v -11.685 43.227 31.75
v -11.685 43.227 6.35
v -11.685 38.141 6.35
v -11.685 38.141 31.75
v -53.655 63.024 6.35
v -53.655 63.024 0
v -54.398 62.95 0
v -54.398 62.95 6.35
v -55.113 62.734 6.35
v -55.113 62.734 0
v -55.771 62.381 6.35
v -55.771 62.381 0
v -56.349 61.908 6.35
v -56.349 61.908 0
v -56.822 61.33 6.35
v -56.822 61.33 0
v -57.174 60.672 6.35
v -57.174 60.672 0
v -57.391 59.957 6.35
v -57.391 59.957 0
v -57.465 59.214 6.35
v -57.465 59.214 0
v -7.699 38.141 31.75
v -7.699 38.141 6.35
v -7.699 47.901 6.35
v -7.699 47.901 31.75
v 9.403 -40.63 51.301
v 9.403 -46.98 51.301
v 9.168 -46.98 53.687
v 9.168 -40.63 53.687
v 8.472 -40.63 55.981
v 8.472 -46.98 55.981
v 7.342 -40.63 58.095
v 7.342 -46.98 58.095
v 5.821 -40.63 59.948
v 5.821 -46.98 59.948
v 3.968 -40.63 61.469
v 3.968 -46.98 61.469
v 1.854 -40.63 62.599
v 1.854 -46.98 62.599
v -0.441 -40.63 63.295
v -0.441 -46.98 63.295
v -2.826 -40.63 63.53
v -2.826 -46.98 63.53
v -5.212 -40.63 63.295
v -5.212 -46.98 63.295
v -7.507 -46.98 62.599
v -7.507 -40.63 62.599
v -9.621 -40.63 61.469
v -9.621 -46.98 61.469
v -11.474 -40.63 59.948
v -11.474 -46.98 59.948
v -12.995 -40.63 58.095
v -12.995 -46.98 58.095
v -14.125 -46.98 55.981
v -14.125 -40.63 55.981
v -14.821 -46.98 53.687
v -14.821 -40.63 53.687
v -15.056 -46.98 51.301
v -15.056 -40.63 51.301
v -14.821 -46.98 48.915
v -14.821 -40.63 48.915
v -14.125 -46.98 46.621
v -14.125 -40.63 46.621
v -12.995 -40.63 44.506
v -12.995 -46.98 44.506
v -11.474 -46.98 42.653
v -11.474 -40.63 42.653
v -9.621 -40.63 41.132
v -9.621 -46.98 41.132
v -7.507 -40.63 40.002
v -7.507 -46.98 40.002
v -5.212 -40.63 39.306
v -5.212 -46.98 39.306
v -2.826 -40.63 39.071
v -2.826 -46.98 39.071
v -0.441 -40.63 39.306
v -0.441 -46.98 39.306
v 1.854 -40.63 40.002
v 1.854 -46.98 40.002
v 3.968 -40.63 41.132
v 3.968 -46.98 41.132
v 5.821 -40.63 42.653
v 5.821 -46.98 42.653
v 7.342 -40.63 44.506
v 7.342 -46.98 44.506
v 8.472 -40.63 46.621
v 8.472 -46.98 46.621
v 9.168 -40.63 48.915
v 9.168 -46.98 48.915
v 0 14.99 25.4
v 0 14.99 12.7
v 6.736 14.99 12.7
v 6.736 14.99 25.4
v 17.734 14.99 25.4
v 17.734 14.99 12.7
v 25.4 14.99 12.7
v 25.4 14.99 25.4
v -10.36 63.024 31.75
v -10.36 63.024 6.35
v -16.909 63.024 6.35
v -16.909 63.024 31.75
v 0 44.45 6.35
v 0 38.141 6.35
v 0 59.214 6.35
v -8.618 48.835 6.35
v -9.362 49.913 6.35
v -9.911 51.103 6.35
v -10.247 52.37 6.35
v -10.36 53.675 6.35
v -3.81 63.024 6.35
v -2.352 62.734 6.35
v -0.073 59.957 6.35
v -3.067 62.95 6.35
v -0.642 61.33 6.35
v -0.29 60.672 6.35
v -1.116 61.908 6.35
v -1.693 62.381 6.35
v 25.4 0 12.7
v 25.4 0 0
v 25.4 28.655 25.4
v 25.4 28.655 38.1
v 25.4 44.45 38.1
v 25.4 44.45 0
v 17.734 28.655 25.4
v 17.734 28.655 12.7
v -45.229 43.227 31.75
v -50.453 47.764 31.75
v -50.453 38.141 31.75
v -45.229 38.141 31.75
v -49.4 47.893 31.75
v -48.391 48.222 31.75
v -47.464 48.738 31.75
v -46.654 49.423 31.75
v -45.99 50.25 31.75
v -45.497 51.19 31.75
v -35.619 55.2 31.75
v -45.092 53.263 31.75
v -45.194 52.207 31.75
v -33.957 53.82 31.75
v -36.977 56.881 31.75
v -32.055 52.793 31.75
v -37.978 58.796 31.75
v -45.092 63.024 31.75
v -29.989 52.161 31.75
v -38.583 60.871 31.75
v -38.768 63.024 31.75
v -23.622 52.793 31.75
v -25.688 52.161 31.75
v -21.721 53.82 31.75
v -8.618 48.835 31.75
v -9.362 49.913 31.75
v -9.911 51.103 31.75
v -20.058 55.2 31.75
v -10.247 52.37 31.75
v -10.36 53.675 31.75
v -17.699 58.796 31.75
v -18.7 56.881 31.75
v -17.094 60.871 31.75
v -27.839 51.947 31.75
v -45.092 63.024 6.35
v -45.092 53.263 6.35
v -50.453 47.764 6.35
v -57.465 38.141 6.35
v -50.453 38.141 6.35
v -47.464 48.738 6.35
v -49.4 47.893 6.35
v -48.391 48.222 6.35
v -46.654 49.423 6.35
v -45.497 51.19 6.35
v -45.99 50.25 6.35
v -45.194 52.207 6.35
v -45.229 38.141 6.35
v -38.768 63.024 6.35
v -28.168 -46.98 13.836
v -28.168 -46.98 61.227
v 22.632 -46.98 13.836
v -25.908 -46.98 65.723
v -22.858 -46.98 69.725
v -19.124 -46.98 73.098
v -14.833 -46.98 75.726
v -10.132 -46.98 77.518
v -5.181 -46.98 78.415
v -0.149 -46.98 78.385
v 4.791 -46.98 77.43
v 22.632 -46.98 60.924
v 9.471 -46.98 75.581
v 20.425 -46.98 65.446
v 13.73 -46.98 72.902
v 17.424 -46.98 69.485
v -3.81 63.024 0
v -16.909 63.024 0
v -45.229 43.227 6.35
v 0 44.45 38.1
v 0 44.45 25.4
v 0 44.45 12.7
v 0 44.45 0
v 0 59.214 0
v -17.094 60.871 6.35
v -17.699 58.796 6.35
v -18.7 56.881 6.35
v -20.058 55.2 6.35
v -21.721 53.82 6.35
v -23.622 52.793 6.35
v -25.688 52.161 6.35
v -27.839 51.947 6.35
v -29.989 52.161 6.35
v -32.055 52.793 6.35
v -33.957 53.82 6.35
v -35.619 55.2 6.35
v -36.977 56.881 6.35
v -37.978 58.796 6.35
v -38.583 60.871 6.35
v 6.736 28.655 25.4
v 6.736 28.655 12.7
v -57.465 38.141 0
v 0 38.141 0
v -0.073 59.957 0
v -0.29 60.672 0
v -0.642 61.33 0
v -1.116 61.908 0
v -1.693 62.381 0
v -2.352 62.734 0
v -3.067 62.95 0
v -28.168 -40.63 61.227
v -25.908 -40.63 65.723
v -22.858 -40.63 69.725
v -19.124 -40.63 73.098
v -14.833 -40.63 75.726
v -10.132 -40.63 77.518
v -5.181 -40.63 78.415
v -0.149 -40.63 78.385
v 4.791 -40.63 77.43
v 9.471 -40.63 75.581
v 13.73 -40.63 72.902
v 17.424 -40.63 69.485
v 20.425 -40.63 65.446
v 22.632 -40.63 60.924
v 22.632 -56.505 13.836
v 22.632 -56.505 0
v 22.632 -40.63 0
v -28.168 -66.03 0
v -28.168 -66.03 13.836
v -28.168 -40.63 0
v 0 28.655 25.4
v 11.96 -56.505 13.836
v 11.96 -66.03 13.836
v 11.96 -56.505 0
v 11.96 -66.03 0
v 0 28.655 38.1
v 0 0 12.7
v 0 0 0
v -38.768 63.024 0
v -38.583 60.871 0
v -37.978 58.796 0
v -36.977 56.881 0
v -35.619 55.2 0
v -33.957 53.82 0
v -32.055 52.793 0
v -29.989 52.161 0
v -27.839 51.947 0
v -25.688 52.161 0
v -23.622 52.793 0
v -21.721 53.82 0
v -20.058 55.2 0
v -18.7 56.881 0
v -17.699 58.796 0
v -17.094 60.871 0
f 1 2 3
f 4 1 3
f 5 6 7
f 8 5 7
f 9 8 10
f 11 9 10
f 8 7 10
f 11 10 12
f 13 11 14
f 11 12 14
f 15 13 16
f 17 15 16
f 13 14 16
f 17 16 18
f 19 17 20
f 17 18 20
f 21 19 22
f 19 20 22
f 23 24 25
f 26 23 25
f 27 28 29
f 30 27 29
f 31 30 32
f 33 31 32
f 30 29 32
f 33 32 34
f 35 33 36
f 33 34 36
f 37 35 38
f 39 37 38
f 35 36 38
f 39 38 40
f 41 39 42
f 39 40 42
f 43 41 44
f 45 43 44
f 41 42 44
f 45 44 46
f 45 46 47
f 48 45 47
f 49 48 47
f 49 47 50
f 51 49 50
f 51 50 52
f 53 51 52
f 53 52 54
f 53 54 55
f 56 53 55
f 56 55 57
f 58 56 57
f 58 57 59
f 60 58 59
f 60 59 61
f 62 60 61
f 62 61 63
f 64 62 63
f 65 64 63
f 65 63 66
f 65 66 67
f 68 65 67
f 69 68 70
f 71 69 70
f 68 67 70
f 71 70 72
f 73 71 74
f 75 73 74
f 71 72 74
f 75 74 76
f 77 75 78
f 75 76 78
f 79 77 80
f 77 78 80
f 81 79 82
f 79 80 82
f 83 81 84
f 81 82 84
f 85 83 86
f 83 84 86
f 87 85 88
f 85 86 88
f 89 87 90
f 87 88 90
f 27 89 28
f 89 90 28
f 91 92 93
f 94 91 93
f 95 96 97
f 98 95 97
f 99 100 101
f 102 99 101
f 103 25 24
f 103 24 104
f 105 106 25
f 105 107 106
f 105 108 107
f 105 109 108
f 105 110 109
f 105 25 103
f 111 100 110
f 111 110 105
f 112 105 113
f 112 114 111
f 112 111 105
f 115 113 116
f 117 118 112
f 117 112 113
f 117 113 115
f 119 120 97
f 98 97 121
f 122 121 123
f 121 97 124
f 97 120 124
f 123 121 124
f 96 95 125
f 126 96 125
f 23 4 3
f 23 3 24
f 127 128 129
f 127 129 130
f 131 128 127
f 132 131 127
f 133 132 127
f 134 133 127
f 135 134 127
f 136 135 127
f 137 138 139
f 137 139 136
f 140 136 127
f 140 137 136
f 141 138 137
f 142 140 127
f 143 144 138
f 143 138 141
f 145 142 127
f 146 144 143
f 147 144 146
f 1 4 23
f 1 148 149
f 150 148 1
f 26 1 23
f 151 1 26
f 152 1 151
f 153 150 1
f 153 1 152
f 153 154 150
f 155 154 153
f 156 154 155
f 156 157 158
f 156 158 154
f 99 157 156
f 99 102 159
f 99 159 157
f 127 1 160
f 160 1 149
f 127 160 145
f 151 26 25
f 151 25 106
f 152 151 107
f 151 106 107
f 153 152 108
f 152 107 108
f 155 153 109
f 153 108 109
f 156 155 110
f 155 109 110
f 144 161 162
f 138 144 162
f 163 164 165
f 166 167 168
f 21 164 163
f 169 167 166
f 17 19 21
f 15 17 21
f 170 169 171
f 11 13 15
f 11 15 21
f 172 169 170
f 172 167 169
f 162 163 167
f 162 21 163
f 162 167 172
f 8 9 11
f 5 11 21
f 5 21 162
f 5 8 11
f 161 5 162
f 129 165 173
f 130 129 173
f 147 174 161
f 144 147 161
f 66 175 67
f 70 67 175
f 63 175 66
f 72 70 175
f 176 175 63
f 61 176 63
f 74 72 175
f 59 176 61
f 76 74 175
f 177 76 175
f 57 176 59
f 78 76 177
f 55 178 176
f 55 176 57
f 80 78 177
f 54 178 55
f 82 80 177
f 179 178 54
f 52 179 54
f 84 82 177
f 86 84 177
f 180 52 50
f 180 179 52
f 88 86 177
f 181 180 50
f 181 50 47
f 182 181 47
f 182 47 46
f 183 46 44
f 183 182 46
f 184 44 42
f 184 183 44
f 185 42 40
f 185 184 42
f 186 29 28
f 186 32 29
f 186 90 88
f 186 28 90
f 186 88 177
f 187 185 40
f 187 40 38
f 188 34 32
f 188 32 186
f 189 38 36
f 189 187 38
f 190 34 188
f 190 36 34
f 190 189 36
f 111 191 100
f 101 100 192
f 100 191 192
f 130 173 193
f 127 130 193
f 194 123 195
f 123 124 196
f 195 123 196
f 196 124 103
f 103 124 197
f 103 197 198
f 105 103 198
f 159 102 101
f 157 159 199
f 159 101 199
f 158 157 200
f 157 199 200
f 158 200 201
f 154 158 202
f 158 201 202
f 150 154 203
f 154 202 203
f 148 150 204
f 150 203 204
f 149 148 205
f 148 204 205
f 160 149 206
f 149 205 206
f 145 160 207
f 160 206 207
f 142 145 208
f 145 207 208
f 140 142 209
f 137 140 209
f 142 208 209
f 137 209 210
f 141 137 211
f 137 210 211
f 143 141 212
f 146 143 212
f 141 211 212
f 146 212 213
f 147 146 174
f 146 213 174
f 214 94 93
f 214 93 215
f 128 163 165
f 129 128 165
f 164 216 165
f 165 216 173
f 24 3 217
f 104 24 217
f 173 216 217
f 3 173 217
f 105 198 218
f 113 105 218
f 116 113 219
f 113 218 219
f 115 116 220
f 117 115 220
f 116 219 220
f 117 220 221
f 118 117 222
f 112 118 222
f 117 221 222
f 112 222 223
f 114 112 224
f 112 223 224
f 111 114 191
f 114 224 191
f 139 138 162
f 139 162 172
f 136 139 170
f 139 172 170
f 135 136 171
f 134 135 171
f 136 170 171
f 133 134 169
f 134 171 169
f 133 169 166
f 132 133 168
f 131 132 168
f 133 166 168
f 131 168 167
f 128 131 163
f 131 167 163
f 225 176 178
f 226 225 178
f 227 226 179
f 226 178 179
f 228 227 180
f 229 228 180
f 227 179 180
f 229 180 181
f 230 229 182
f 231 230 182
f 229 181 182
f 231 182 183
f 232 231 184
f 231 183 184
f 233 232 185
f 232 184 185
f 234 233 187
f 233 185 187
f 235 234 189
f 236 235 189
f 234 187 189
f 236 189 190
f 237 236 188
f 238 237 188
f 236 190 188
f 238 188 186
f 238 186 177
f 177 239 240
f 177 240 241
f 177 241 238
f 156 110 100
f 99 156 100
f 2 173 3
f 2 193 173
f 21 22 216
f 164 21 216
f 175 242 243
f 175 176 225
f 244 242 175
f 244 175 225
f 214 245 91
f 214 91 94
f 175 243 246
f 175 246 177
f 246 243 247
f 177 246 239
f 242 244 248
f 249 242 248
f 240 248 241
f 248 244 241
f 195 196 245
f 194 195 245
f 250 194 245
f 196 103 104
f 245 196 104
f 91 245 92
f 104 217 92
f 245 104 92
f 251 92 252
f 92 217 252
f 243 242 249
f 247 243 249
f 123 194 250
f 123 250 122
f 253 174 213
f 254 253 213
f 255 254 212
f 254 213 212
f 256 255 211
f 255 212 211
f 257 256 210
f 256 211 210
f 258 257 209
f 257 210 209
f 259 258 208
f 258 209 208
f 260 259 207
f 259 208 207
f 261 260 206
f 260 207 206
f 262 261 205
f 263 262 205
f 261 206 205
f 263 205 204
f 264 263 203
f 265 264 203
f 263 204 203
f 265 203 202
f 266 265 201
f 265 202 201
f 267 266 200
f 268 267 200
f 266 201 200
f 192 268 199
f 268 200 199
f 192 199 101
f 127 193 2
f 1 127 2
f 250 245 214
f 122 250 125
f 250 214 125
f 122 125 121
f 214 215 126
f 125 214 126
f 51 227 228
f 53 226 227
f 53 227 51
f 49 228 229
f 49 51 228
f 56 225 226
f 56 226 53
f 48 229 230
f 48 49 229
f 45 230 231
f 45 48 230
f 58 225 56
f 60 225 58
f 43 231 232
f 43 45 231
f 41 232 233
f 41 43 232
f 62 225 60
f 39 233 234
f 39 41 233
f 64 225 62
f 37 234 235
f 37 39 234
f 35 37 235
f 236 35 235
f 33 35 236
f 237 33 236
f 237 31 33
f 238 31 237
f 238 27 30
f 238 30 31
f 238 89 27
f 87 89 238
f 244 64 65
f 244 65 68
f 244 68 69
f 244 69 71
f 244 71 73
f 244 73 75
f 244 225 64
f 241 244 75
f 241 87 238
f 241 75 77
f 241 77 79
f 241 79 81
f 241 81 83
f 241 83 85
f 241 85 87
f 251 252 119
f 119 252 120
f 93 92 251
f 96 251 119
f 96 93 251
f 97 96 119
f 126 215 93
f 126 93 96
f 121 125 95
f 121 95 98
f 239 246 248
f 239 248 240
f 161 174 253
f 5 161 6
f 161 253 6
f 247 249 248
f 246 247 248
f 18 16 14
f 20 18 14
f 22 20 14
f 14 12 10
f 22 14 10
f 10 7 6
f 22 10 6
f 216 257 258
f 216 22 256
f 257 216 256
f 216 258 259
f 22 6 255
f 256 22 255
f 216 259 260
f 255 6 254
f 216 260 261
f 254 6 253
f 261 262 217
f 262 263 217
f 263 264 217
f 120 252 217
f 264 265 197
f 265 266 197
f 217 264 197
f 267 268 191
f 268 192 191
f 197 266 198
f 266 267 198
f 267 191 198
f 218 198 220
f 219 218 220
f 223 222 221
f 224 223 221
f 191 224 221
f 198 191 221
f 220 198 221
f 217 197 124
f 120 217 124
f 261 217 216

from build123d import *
from build123d import SkipClean  # not in build123d's __all__

# Parameters (mm, degrees)
F0_W      = 25.4
F0_H      = 44.45
F1_DEPTH  = 12.7
F2_W      = 25.4
F2_H      = 29.4602914497
F3_DEPTH  = 12.7
F4_W      = 10.9979929402
F4_H      = 13.6651070789
F5_DEPTH  = 12.7
F7_DEPTH  = 12.7
F8_W      = 50.8
F8_H      = 25.4
F9_DEPTH  = 101.6
F11_DEPTH = 25.4
F12_R     = 12.2295787835
F13_DEPTH = 25.4
F14_R     = 12.2295787835
F15_DEPTH = 19.05
F16_W     = 10.6714690655
F16_H     = 9.525
F17_DEPTH = 25.4
F19_DEPTH = 6.35
F21_DEPTH = 25.4
F23_DEPTH = 25.4


with BuildPart() as f1:
    # F0 (on Top) → F1 (new body)
    with BuildSketch(Plane.XY):
        with Locations((12.7, 22.225)):
            Rectangle(F0_W, F0_H)
    extrude(amount=F1_DEPTH)

    # F2 (on face) → F3 (join)
    with BuildSketch(Plane.XY.offset(12.7)):
        with Locations((12.7, 29.7198542751)):
            Rectangle(F2_W, F2_H)
    extrude(amount=F3_DEPTH)

    # F4 (on face) → F5 (cut)
    with BuildSketch(Plane.XY.offset(25.4)):
        with Locations((12.2352666222, 21.8222620897)):
            Rectangle(F4_W, F4_H)
    extrude(amount=-F5_DEPTH, mode=Mode.SUBTRACT)

    # F6 (on face) → F7 (join)
    with BuildSketch(Plane.XY.offset(25.4)):
        Polygon((25.4, 44.45), (0, 44.45), (0, 28.6548156291), (6.736270152, 28.6548156291), (17.7342630923, 28.6548156291), (25.4, 28.6548156291), align=None)
    extrude(amount=F7_DEPTH)

    # F18 (on Top) → F19 (join)
    with BuildSketch(Plane.XY):
        with BuildLine():
            Line((-3.81, 63.023544848), (-53.6545139277, 63.023544848))
            ThreePointArc((-53.6545139277, 63.023544848), (-56.348590764, 61.9076216843), (-57.4645139277, 59.213544848))
            Line((-57.4645139277, 59.213544848), (-57.4645139277, 38.1405837834))
            Line((-57.4645139277, 38.1405837834), (0, 38.1405837834))
            Line((0, 38.1405837834), (0, 59.213544848))
            ThreePointArc((0, 59.213544848), (-1.1159231637, 61.9076216843), (-3.81, 63.023544848))
        make_face()
    extrude(amount=F19_DEPTH)

    # F20 (on face) → F21 (cut)
    with BuildSketch(Plane.XY.offset(6.35)):
        with BuildLine():
            Line((-16.9094149023, 63.023544848), (-38.7679263949, 63.023544848))
            ThreePointArc((-38.7679263949, 63.023544848), (-27.8386706486, 51.9472434828), (-16.9094149023, 63.023544848))
        make_face()
    extrude(amount=-F21_DEPTH, mode=Mode.SUBTRACT)

    # F22 (on face) → F23 (join)
    with BuildSketch(Plane.XY.offset(6.35)):
        with BuildLine():
            Line((-45.2292449772, 38.1405837834), (-45.2292449772, 43.2271584868))
            Line((-45.2292449772, 43.2271584868), (-11.6853676736, 43.2271584868))
            Line((-11.6853676736, 43.2271584868), (-11.6853676736, 38.1405837834))
            Line((-11.6853676736, 38.1405837834), (-7.6985950582, 38.1405837834))
            Line((-7.6985950582, 38.1405837834), (-7.6985950582, 47.9013063014))
            ThreePointArc((-7.6985950582, 47.9013063014), (-9.6624188313, 50.4964154712), (-10.3597074512, 53.6752492189))
            Line((-10.3597074512, 53.6752492189), (-10.3597074512, 63.023544848))
            Line((-10.3597074512, 63.023544848), (-16.9094149023, 63.023544848))
            ThreePointArc((-16.9094149023, 63.023544848), (-27.8386706486, 51.9472434828), (-38.7679263949, 63.023544848))
            Line((-38.7679263949, 63.023544848), (-45.0917705894, 63.023544848))
            Line((-45.0917705894, 63.023544848), (-45.0917705894, 53.2628260553))
            ThreePointArc((-45.0917705894, 53.2628260553), (-46.6539859613, 49.4227442996), (-50.4532940686, 47.7638281882))
            Line((-50.4532940686, 47.7638281882), (-50.4532940686, 38.1405837834))
            Line((-50.4532940686, 38.1405837834), (-45.2292449772, 38.1405837834))
        make_face()
    with SkipClean():  # cleaning this boolean's faces spoils the solid; the shape is the same uncleaned
        extrude(amount=F23_DEPTH)


with BuildPart() as f9:
    # F8 (on Top) → F9 (new body)
    with BuildSketch(Plane.XY):
        with Locations((-2.7682126224, -53.3297498107)):
            Rectangle(F8_W, F8_H)
    extrude(amount=F9_DEPTH)

    # F10 (on face) → F11 (cut)
    with BuildSketch(Plane.XZ.offset(66.0297498107)):
        with BuildLine():
            ThreePointArc((-28.1682126224, 61.2272843719), (-2.6642465557, 78.5167686352), (22.6317873776, 60.9244629741))
            Line((22.6317873776, 60.9244629741), (22.6317873776, 101.6))
            Line((22.6317873776, 101.6), (-28.1682126224, 101.6))
            Line((-28.1682126224, 101.6), (-28.1682126224, 61.2272843719))
        make_face()
    extrude(amount=-F11_DEPTH, mode=Mode.SUBTRACT)

    # F12 (on face) → F13 (cut)
    with BuildSketch(Plane.XZ.offset(66.0297498107)):
        with Locations((-2.826482869, 51.3007106537)):
            Circle(F12_R)
    extrude(amount=-F13_DEPTH, mode=Mode.SUBTRACT)

    # F14 (on face) → F15 (cut)
    with BuildSketch(Plane.XZ.offset(66.0297498107)):
        with BuildLine():
            Line((-28.1682126224, 61.2272843719), (-28.1682126224, 13.8355828822))
            Line((-28.1682126224, 13.8355828822), (22.6317873776, 13.8355828822))
            Line((22.6317873776, 13.8355828822), (22.6317873776, 60.9244629741))
            ThreePointArc((22.6317873776, 60.9244629741), (-2.6642465557, 78.5167686352), (-28.1682126224, 61.2272843719))
        make_face()
        with Locations((-2.826482869, 51.3007106537)):
            Circle(F14_R, mode=Mode.SUBTRACT)
    extrude(amount=-F15_DEPTH, mode=Mode.SUBTRACT)

    # F16 (on face) → F17 (cut)
    with BuildSketch(Plane.XY.offset(13.8355828822)):
        with Locations((17.2960528448, -61.2672498107)):
            Rectangle(F16_W, F16_H)
    extrude(amount=-F17_DEPTH, mode=Mode.SUBTRACT)


solid = Compound([f1.part, f9.part])
